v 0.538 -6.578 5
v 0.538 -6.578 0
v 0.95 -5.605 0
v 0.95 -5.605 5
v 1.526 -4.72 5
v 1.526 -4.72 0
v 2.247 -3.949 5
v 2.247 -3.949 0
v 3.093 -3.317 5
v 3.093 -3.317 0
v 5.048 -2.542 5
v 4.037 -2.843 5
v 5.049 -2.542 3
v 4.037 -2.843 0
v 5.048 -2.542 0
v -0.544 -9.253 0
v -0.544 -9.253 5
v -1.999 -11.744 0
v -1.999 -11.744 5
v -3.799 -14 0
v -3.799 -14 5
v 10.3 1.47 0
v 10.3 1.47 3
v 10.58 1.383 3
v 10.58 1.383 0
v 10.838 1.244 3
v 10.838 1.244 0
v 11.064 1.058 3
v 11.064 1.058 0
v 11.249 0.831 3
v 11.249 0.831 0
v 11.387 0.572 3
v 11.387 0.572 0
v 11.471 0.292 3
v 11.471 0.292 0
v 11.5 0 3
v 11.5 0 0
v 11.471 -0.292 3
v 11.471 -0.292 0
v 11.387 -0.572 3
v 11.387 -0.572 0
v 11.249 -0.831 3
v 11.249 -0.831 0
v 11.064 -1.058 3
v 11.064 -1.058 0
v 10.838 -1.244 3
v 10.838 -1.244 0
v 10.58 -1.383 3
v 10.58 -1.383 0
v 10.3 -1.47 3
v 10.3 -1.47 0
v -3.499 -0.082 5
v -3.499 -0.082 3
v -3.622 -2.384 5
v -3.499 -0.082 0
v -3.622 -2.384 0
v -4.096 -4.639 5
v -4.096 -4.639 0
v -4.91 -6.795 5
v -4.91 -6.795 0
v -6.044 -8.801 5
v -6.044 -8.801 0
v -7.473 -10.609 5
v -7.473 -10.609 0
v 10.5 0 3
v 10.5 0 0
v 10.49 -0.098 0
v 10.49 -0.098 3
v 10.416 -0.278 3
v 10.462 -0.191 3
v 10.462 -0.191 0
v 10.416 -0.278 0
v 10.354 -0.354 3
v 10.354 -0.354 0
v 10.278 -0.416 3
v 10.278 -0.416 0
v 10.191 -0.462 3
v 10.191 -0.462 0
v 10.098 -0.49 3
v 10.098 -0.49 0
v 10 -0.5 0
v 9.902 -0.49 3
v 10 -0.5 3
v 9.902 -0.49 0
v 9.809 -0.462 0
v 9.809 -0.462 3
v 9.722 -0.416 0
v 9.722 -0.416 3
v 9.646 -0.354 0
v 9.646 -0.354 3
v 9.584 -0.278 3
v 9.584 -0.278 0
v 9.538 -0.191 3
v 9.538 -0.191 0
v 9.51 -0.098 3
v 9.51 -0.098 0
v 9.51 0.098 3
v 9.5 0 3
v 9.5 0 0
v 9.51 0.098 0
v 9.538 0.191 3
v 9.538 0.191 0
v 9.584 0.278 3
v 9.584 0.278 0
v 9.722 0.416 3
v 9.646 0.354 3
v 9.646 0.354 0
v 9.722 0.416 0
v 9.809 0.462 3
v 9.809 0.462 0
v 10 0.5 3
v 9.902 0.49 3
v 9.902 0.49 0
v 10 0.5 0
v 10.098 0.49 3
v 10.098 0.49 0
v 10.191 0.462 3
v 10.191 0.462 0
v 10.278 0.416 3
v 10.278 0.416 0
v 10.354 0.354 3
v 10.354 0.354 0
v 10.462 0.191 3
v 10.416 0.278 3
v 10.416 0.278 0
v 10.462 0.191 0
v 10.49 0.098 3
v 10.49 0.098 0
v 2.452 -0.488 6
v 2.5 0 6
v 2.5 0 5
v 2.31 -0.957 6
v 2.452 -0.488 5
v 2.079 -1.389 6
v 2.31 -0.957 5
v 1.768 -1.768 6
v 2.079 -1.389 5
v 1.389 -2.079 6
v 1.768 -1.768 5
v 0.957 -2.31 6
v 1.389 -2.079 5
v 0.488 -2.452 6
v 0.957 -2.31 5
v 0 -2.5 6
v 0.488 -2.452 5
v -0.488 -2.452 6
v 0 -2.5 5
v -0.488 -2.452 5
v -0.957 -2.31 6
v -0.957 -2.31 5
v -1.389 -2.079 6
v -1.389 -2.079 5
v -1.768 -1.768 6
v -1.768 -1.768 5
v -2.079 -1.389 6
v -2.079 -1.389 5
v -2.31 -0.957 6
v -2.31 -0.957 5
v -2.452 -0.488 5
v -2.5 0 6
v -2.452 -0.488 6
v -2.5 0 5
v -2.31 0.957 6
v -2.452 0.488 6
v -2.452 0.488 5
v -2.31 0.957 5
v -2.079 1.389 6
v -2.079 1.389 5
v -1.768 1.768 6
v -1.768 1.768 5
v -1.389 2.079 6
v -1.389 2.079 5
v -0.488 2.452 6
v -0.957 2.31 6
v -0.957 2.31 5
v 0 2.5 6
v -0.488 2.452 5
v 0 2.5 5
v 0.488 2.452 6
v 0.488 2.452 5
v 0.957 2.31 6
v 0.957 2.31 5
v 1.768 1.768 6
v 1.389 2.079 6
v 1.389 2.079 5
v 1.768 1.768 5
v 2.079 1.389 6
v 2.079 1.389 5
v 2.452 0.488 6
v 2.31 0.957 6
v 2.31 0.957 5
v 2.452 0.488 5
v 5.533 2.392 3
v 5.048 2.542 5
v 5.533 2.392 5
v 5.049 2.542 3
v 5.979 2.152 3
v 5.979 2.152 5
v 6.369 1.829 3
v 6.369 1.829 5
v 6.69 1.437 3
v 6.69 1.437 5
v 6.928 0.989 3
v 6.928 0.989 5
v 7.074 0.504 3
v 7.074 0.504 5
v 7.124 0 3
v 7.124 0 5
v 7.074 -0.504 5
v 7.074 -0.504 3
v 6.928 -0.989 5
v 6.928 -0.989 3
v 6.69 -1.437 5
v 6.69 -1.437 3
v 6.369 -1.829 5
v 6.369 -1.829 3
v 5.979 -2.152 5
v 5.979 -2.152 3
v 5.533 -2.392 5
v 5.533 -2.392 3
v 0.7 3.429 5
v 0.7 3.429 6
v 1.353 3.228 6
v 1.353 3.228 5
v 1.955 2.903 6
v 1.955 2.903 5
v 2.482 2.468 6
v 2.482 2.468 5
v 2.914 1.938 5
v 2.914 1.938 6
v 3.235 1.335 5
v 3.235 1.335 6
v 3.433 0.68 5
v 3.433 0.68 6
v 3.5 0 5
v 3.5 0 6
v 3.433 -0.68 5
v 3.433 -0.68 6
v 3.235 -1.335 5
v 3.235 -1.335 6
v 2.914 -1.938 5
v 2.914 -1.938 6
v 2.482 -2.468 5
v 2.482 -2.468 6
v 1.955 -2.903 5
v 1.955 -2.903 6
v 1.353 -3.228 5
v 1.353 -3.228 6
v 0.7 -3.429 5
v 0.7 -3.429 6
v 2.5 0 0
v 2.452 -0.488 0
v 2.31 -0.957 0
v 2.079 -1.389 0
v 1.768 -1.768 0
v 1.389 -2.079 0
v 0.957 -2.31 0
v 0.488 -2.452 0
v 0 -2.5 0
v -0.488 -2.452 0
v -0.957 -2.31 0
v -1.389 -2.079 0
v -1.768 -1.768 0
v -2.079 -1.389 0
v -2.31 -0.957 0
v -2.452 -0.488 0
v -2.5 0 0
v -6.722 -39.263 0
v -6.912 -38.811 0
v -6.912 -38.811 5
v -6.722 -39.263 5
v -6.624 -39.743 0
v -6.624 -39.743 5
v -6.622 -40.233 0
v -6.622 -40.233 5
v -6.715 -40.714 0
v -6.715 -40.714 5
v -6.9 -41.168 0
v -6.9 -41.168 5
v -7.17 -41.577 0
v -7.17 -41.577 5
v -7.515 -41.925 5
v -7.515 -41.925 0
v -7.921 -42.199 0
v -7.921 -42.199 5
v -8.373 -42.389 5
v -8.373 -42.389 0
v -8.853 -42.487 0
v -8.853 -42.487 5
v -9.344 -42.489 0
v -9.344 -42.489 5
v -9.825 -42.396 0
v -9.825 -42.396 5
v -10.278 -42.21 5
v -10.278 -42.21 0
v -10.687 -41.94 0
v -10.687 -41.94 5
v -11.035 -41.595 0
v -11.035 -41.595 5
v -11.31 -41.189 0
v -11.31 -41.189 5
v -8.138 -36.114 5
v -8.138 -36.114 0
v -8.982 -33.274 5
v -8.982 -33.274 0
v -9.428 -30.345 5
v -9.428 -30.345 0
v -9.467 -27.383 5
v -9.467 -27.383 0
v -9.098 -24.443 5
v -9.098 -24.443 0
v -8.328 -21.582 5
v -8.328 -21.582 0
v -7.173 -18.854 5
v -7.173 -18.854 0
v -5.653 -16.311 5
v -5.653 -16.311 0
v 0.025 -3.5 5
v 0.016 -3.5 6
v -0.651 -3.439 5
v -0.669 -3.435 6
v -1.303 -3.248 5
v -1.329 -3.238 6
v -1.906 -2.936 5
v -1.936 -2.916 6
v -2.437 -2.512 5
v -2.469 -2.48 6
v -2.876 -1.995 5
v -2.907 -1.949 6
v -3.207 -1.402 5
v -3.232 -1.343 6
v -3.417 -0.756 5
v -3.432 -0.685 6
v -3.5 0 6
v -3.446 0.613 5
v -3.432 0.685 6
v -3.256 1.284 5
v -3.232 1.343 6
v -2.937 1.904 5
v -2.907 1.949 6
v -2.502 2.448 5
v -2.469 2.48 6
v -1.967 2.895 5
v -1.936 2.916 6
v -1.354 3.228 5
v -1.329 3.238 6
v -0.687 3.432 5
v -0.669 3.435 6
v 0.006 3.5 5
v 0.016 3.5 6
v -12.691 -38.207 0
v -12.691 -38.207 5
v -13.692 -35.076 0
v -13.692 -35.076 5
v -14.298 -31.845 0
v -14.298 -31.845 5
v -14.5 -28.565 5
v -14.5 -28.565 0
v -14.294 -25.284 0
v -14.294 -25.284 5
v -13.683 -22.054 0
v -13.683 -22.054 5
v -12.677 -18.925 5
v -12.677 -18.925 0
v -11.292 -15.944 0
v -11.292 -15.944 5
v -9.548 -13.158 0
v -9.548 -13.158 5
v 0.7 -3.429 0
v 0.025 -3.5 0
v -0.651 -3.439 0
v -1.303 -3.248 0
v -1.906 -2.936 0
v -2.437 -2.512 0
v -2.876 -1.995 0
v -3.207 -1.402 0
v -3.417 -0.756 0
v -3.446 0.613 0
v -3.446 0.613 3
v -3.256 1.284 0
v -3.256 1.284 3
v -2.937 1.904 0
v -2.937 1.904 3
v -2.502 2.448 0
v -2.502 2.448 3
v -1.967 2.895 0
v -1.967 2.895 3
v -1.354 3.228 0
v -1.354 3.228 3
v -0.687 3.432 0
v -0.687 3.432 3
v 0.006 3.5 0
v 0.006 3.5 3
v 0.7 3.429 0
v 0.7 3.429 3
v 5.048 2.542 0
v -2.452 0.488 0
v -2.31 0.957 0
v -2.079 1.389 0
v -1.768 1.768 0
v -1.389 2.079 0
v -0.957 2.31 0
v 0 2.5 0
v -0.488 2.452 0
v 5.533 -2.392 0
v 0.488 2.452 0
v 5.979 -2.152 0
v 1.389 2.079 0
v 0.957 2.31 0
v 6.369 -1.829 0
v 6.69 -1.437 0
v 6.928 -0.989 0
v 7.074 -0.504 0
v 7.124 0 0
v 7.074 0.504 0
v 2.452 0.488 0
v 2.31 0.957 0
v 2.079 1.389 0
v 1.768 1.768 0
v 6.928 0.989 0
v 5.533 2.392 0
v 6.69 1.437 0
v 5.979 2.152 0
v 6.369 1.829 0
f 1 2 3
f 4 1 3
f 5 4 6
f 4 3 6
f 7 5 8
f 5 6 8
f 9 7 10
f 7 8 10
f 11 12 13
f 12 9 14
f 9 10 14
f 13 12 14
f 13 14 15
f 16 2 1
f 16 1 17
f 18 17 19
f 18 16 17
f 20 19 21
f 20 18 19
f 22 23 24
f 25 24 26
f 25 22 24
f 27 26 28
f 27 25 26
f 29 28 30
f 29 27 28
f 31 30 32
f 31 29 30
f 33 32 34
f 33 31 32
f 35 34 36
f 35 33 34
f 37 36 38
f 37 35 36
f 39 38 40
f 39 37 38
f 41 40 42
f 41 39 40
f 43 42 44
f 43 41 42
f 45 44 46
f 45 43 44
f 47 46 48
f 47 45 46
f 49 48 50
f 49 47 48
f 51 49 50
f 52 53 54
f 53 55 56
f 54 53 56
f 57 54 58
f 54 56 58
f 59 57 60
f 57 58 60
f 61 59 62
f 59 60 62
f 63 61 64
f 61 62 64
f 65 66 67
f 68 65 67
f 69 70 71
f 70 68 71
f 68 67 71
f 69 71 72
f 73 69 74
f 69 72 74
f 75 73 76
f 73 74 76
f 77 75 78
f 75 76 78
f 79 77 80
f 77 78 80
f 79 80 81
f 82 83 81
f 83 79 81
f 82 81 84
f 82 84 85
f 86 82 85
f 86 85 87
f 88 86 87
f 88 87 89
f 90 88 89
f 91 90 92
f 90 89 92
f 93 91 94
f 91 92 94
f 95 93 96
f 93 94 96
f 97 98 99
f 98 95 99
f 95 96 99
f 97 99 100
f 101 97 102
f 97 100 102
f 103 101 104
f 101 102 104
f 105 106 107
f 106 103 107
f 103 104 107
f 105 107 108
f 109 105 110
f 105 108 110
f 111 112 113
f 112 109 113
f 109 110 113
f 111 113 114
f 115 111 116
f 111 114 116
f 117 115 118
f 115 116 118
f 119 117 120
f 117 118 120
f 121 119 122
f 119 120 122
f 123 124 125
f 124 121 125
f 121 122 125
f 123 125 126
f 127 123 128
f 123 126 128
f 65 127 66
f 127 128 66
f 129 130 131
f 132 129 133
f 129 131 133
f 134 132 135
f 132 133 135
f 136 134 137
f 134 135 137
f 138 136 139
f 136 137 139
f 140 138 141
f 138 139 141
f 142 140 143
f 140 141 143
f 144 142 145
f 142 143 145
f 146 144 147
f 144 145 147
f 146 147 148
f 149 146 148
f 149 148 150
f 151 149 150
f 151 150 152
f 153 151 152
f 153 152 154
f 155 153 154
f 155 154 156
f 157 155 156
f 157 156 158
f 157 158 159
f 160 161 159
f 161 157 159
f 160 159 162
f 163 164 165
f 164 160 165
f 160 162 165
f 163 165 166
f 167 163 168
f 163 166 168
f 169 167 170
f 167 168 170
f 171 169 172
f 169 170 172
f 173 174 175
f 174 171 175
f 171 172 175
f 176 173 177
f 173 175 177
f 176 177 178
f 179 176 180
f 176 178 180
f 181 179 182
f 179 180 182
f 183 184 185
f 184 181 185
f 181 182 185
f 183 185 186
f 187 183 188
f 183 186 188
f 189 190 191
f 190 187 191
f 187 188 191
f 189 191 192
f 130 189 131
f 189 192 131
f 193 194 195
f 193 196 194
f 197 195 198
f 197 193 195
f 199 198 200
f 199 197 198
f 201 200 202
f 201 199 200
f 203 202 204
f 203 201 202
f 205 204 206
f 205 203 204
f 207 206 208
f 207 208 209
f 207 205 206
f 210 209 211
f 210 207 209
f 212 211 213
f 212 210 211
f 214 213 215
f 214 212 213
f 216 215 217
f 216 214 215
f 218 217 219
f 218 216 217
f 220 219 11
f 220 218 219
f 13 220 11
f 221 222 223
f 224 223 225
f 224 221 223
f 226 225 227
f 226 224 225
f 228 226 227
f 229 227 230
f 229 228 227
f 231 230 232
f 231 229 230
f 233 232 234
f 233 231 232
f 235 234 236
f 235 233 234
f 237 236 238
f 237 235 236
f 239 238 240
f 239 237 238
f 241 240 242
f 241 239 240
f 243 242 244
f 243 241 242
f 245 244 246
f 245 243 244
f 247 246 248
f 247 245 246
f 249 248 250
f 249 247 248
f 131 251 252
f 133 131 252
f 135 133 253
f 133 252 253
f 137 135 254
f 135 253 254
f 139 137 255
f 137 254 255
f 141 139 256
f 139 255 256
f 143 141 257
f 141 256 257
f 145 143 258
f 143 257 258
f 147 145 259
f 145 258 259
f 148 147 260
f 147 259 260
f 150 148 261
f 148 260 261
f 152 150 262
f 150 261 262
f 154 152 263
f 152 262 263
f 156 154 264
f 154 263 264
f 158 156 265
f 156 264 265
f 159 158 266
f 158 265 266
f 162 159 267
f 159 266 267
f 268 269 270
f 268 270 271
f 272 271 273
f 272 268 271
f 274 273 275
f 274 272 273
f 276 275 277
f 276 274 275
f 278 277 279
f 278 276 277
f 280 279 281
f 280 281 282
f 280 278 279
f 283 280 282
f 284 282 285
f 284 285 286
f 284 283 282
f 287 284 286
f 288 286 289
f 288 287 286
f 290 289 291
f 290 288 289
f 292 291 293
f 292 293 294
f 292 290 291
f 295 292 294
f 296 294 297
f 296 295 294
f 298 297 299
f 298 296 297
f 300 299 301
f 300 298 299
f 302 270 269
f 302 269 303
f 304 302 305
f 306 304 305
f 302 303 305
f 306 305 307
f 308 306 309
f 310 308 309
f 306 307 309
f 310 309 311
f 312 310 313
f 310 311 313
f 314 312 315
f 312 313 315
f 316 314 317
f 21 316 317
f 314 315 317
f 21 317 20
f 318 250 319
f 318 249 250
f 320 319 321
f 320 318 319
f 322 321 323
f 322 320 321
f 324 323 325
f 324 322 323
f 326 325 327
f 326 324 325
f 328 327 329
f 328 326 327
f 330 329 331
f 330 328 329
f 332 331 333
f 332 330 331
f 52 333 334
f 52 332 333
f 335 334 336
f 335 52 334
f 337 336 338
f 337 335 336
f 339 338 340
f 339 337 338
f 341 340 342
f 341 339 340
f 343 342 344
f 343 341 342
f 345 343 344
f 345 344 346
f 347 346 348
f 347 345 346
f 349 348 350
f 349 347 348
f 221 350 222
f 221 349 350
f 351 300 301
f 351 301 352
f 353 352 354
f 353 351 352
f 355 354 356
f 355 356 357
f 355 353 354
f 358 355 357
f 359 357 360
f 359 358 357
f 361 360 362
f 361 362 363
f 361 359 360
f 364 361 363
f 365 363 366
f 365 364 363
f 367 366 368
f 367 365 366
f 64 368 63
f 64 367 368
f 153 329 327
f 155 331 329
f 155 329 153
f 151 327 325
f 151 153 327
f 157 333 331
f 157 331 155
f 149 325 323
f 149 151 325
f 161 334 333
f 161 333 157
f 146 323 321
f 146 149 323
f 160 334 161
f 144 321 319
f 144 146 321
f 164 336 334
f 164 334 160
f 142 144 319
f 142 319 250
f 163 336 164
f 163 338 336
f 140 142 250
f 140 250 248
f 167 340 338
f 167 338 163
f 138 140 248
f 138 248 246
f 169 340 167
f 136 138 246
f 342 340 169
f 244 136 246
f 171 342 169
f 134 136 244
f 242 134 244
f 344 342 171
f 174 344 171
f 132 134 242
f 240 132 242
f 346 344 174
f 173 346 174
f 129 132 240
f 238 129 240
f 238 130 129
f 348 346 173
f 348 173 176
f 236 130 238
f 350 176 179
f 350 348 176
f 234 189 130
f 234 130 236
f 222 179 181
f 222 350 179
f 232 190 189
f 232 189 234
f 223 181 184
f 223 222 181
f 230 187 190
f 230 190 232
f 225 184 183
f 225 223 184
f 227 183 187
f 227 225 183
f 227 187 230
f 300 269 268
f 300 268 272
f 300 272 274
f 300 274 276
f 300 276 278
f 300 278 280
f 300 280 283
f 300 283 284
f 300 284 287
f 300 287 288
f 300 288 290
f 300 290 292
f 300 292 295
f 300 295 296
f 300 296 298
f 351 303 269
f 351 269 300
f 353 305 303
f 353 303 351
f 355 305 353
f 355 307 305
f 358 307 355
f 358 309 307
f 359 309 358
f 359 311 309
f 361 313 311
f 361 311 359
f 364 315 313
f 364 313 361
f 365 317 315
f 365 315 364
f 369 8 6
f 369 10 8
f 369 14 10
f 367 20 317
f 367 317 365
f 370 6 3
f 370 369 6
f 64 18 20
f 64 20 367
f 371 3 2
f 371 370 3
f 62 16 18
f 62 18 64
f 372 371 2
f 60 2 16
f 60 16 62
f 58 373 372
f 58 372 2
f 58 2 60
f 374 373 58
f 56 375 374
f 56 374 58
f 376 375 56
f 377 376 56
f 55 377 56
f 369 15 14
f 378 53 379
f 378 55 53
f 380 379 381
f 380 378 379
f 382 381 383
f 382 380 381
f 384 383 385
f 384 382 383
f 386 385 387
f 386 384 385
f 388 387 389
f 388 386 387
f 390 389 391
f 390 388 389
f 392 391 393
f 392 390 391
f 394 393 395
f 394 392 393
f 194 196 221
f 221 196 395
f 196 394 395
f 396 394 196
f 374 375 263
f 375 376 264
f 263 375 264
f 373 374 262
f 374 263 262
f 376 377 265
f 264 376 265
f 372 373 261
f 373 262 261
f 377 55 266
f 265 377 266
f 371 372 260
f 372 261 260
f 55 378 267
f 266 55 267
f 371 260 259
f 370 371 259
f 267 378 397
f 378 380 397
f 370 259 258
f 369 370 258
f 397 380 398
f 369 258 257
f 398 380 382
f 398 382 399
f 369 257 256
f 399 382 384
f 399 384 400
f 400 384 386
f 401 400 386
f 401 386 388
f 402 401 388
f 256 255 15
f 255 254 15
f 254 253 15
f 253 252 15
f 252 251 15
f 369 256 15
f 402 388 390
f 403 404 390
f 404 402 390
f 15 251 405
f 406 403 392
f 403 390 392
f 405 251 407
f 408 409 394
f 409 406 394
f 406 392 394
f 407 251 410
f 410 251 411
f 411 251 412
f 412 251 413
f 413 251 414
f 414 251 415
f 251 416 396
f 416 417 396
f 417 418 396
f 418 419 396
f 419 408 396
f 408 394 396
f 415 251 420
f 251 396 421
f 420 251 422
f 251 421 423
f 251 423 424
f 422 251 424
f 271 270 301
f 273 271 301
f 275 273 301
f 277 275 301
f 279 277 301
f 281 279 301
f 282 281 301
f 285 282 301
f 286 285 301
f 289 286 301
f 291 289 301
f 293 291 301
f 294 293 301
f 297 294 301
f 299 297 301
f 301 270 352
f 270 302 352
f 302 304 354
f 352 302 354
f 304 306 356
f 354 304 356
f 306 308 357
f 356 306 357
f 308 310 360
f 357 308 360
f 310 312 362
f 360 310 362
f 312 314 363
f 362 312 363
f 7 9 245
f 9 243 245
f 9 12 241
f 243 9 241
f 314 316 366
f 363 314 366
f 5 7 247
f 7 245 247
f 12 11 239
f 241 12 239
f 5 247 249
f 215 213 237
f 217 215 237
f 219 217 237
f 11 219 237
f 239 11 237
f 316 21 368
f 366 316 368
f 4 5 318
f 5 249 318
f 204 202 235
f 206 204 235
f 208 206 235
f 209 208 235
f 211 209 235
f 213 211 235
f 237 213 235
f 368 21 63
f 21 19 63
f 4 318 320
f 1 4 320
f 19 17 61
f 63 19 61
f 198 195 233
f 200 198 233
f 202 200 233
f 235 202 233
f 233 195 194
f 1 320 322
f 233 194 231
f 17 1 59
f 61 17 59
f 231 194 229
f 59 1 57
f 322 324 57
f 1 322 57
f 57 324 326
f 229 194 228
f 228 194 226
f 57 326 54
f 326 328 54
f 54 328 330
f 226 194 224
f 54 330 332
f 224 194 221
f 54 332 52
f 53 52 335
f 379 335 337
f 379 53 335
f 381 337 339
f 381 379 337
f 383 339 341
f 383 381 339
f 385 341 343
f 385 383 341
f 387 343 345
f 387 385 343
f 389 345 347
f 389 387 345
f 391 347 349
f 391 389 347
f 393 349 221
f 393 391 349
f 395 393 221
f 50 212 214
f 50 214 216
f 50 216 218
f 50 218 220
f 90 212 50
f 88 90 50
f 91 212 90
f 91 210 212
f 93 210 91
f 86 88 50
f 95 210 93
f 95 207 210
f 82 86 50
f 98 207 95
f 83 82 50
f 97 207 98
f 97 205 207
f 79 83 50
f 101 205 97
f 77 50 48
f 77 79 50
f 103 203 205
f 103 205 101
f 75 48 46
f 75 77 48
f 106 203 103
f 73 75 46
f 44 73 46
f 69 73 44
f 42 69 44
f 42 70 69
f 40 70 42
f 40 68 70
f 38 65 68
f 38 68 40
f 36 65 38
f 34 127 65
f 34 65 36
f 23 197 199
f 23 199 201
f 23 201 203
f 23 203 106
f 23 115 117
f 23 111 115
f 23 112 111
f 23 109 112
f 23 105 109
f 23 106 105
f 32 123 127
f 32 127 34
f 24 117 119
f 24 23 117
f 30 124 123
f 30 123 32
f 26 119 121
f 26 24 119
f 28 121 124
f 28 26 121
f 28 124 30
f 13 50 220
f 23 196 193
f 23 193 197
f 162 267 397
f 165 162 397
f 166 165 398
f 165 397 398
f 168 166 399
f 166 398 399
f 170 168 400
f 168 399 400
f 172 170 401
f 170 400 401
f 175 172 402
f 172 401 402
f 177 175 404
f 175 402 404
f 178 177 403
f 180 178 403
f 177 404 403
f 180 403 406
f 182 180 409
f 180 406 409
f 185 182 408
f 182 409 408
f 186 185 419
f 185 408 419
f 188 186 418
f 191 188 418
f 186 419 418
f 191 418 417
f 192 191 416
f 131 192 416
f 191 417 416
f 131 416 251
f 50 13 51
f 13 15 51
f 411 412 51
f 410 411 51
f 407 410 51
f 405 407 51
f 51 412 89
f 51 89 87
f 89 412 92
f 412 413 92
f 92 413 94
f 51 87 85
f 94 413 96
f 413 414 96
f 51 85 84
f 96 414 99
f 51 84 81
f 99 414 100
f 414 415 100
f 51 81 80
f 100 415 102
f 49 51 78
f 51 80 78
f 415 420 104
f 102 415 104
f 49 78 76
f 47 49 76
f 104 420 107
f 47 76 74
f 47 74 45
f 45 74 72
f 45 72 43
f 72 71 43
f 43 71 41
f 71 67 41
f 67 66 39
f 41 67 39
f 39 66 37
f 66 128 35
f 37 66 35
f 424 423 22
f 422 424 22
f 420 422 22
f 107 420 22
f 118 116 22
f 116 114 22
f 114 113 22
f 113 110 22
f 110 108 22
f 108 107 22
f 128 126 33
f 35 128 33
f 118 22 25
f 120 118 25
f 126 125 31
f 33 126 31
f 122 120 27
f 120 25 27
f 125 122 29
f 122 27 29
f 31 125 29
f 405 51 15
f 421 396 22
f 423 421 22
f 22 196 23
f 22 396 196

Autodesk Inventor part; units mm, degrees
ref_plane "YZ Plane" through (0, 0, 0) normal (1, 0, 0) x (0, 1, 0)
ref_plane "XZ Plane" through (0, 0, 0) normal (0, 1, 0) x (-1, 0, 0)
ref_plane "XY Plane" through (0, 0, 0) normal (0, 0, 1) x (1, 0, 0)
sketch "Sketch1" plane through (0, 0, 0) normal (0, 0, 1) x (1, 0, 0)
  circle A0 centre (0, 0) radius 2.5
  circle A1 centre (0, 0) radius 3.5
  line L0 (0, 0) -> (10, 0) construction
  circle A2 centre (10, 0) radius 1.5
  circle A3 centre (10, 0) radius 0.5
  line L1 (0.7, 3.4293) -> (10.3, 1.4697)
  line L2 (0.7, -3.4293) -> (10.3, -1.4697)
  dimension "d0" = 5
  dimension "d1" = 7
  dimension "d2" = 3
  dimension "d3" = 1
  dimension "d4" = 10
extrude "Extrusion1" add sketch "Sketch1" along normal blind 3
sketch "Sketch2" plane through (0, 0, 3) normal (0, 0, 1) x (1, 0, 0)
  line L0 (0.7, -3.4293) -> (10.3, -1.4697) projected
  arc A0 (10.3, -1.4697) -> (10.3, 1.4697) centre (10, 0) ccw projected
  line L1 (10.3, 1.4697) -> (0.7, 3.4293) projected
  arc A1 (0.7, 3.4293) -> (0.7, -3.4293) centre (0, 0) ccw projected
  circle A2 centre (10, 0) radius 0.5 projected
  circle A3 centre (0, 0) radius 2.5 projected
  arc A4 (0.7, 3.4293) -> (0.7, -3.4293) centre (0, 0) ccw projected
  circle A5 centre (0, 0) radius 3.5
  point P0 (0.7, -3.4293)
extrude "Extrusion2" add sketch "Sketch2" along normal blind 3 contours A1 A5
sketch "Sketch3" plane through (0, 0, 0) normal (0, 0, -1) x (-1, 0, 0)
  line L0 (0, 0) -> (13.4825, -19.2549) construction
  circle A0 centre (-10, 0) radius 0.5 projected
  line L1 (0, 0) -> (-10, 0) construction
  line L2 (0, 0) -> (-9.8298, -6.8829) construction
  circle A1 centre (0, 0) radius 12 construction
  line L3 (-9.8298, -6.8829) -> (6.5648, -30.2969) construction
  circle A2 centre (6.5648, -30.2969) radius 21 construction
  line L4 (0, 0) -> (-12, 0) construction
  line L5 (-12, 0) -> (-12, -49.2406) construction
  circle A3 centre (0, 0) radius 31 construction
  circle A4 centre (-12, -28.5832) radius 21 construction
  arc A5 (11.3096, -41.1892) -> (7.4726, -10.6092) centre (-12, -28.5832) ccw
  arc A6 (-10.3, 1.4697) -> (-10.3, -1.4697) centre (-10, 0) ccw projected
  line L6 (-0.7, -3.4293) -> (-10.3, -1.4697) projected
  arc A7 (-0.7, -3.4293) -> (-0.7, 3.4293) centre (0, 0) ccw projected
  line L7 (-10.3, 1.4697) -> (-0.7, 3.4293) projected
  circle A8 centre (-10, 0) radius 0.5 projected
  circle A9 centre (0, 0) radius 2.5 projected
  arc A10 (3.499, -0.0823) -> (7.4726, -10.6092) centre (18.4949, -0.4352) ccw
  arc A11 (6.9116, -38.8108) -> (3.7986, -14.0005) centre (-12, -28.5832) ccw
  arc A12 (-0.5385, -6.5777) -> (3.7986, -14.0005) centre (18.4949, -0.4352) ccw
  arc A13 (-0.5385, -6.5777) -> (-5.0485, -2.5416) centre (-6.2485, -8.4204) ccw
  line L8 (-10.3, 1.4697) -> (-0.7, 3.4293) projected
  arc A14 (-5.0485, 2.5416) -> (-5.0485, -2.5416) centre (-4.5297, 0) ccw
  line L9 (-0.7, -3.4293) -> (-10.3, -1.4697) projected
  line L10 (-10.3, 1.4697) -> (-0.7, 3.4293) projected
  arc A15 (6.9116, -38.8108) -> (11.3096, -41.1892) centre (9.1106, -40) ccw
  dimension "d10" = 24
  dimension "d9" = 125
  dimension "d11" = 42
  dimension "d12" = 12
  dimension "d13" = 62
  dimension "d14" = 42
  dimension "d17" = 15
  dimension "d18" = 26.5
  dimension "d19" = 5
  dimension "d20" = 5
  dimension "d21" = 6
  dimension "d22" = 40
extrude "Extrusion3" add sketch "Sketch3" against normal blind 5 contours A15 A11 A12 A13 L6 A7 A10 A5 | A7 L6 A14 L7
equation "\"d20\" = d19"
properties part number "claw-w"
